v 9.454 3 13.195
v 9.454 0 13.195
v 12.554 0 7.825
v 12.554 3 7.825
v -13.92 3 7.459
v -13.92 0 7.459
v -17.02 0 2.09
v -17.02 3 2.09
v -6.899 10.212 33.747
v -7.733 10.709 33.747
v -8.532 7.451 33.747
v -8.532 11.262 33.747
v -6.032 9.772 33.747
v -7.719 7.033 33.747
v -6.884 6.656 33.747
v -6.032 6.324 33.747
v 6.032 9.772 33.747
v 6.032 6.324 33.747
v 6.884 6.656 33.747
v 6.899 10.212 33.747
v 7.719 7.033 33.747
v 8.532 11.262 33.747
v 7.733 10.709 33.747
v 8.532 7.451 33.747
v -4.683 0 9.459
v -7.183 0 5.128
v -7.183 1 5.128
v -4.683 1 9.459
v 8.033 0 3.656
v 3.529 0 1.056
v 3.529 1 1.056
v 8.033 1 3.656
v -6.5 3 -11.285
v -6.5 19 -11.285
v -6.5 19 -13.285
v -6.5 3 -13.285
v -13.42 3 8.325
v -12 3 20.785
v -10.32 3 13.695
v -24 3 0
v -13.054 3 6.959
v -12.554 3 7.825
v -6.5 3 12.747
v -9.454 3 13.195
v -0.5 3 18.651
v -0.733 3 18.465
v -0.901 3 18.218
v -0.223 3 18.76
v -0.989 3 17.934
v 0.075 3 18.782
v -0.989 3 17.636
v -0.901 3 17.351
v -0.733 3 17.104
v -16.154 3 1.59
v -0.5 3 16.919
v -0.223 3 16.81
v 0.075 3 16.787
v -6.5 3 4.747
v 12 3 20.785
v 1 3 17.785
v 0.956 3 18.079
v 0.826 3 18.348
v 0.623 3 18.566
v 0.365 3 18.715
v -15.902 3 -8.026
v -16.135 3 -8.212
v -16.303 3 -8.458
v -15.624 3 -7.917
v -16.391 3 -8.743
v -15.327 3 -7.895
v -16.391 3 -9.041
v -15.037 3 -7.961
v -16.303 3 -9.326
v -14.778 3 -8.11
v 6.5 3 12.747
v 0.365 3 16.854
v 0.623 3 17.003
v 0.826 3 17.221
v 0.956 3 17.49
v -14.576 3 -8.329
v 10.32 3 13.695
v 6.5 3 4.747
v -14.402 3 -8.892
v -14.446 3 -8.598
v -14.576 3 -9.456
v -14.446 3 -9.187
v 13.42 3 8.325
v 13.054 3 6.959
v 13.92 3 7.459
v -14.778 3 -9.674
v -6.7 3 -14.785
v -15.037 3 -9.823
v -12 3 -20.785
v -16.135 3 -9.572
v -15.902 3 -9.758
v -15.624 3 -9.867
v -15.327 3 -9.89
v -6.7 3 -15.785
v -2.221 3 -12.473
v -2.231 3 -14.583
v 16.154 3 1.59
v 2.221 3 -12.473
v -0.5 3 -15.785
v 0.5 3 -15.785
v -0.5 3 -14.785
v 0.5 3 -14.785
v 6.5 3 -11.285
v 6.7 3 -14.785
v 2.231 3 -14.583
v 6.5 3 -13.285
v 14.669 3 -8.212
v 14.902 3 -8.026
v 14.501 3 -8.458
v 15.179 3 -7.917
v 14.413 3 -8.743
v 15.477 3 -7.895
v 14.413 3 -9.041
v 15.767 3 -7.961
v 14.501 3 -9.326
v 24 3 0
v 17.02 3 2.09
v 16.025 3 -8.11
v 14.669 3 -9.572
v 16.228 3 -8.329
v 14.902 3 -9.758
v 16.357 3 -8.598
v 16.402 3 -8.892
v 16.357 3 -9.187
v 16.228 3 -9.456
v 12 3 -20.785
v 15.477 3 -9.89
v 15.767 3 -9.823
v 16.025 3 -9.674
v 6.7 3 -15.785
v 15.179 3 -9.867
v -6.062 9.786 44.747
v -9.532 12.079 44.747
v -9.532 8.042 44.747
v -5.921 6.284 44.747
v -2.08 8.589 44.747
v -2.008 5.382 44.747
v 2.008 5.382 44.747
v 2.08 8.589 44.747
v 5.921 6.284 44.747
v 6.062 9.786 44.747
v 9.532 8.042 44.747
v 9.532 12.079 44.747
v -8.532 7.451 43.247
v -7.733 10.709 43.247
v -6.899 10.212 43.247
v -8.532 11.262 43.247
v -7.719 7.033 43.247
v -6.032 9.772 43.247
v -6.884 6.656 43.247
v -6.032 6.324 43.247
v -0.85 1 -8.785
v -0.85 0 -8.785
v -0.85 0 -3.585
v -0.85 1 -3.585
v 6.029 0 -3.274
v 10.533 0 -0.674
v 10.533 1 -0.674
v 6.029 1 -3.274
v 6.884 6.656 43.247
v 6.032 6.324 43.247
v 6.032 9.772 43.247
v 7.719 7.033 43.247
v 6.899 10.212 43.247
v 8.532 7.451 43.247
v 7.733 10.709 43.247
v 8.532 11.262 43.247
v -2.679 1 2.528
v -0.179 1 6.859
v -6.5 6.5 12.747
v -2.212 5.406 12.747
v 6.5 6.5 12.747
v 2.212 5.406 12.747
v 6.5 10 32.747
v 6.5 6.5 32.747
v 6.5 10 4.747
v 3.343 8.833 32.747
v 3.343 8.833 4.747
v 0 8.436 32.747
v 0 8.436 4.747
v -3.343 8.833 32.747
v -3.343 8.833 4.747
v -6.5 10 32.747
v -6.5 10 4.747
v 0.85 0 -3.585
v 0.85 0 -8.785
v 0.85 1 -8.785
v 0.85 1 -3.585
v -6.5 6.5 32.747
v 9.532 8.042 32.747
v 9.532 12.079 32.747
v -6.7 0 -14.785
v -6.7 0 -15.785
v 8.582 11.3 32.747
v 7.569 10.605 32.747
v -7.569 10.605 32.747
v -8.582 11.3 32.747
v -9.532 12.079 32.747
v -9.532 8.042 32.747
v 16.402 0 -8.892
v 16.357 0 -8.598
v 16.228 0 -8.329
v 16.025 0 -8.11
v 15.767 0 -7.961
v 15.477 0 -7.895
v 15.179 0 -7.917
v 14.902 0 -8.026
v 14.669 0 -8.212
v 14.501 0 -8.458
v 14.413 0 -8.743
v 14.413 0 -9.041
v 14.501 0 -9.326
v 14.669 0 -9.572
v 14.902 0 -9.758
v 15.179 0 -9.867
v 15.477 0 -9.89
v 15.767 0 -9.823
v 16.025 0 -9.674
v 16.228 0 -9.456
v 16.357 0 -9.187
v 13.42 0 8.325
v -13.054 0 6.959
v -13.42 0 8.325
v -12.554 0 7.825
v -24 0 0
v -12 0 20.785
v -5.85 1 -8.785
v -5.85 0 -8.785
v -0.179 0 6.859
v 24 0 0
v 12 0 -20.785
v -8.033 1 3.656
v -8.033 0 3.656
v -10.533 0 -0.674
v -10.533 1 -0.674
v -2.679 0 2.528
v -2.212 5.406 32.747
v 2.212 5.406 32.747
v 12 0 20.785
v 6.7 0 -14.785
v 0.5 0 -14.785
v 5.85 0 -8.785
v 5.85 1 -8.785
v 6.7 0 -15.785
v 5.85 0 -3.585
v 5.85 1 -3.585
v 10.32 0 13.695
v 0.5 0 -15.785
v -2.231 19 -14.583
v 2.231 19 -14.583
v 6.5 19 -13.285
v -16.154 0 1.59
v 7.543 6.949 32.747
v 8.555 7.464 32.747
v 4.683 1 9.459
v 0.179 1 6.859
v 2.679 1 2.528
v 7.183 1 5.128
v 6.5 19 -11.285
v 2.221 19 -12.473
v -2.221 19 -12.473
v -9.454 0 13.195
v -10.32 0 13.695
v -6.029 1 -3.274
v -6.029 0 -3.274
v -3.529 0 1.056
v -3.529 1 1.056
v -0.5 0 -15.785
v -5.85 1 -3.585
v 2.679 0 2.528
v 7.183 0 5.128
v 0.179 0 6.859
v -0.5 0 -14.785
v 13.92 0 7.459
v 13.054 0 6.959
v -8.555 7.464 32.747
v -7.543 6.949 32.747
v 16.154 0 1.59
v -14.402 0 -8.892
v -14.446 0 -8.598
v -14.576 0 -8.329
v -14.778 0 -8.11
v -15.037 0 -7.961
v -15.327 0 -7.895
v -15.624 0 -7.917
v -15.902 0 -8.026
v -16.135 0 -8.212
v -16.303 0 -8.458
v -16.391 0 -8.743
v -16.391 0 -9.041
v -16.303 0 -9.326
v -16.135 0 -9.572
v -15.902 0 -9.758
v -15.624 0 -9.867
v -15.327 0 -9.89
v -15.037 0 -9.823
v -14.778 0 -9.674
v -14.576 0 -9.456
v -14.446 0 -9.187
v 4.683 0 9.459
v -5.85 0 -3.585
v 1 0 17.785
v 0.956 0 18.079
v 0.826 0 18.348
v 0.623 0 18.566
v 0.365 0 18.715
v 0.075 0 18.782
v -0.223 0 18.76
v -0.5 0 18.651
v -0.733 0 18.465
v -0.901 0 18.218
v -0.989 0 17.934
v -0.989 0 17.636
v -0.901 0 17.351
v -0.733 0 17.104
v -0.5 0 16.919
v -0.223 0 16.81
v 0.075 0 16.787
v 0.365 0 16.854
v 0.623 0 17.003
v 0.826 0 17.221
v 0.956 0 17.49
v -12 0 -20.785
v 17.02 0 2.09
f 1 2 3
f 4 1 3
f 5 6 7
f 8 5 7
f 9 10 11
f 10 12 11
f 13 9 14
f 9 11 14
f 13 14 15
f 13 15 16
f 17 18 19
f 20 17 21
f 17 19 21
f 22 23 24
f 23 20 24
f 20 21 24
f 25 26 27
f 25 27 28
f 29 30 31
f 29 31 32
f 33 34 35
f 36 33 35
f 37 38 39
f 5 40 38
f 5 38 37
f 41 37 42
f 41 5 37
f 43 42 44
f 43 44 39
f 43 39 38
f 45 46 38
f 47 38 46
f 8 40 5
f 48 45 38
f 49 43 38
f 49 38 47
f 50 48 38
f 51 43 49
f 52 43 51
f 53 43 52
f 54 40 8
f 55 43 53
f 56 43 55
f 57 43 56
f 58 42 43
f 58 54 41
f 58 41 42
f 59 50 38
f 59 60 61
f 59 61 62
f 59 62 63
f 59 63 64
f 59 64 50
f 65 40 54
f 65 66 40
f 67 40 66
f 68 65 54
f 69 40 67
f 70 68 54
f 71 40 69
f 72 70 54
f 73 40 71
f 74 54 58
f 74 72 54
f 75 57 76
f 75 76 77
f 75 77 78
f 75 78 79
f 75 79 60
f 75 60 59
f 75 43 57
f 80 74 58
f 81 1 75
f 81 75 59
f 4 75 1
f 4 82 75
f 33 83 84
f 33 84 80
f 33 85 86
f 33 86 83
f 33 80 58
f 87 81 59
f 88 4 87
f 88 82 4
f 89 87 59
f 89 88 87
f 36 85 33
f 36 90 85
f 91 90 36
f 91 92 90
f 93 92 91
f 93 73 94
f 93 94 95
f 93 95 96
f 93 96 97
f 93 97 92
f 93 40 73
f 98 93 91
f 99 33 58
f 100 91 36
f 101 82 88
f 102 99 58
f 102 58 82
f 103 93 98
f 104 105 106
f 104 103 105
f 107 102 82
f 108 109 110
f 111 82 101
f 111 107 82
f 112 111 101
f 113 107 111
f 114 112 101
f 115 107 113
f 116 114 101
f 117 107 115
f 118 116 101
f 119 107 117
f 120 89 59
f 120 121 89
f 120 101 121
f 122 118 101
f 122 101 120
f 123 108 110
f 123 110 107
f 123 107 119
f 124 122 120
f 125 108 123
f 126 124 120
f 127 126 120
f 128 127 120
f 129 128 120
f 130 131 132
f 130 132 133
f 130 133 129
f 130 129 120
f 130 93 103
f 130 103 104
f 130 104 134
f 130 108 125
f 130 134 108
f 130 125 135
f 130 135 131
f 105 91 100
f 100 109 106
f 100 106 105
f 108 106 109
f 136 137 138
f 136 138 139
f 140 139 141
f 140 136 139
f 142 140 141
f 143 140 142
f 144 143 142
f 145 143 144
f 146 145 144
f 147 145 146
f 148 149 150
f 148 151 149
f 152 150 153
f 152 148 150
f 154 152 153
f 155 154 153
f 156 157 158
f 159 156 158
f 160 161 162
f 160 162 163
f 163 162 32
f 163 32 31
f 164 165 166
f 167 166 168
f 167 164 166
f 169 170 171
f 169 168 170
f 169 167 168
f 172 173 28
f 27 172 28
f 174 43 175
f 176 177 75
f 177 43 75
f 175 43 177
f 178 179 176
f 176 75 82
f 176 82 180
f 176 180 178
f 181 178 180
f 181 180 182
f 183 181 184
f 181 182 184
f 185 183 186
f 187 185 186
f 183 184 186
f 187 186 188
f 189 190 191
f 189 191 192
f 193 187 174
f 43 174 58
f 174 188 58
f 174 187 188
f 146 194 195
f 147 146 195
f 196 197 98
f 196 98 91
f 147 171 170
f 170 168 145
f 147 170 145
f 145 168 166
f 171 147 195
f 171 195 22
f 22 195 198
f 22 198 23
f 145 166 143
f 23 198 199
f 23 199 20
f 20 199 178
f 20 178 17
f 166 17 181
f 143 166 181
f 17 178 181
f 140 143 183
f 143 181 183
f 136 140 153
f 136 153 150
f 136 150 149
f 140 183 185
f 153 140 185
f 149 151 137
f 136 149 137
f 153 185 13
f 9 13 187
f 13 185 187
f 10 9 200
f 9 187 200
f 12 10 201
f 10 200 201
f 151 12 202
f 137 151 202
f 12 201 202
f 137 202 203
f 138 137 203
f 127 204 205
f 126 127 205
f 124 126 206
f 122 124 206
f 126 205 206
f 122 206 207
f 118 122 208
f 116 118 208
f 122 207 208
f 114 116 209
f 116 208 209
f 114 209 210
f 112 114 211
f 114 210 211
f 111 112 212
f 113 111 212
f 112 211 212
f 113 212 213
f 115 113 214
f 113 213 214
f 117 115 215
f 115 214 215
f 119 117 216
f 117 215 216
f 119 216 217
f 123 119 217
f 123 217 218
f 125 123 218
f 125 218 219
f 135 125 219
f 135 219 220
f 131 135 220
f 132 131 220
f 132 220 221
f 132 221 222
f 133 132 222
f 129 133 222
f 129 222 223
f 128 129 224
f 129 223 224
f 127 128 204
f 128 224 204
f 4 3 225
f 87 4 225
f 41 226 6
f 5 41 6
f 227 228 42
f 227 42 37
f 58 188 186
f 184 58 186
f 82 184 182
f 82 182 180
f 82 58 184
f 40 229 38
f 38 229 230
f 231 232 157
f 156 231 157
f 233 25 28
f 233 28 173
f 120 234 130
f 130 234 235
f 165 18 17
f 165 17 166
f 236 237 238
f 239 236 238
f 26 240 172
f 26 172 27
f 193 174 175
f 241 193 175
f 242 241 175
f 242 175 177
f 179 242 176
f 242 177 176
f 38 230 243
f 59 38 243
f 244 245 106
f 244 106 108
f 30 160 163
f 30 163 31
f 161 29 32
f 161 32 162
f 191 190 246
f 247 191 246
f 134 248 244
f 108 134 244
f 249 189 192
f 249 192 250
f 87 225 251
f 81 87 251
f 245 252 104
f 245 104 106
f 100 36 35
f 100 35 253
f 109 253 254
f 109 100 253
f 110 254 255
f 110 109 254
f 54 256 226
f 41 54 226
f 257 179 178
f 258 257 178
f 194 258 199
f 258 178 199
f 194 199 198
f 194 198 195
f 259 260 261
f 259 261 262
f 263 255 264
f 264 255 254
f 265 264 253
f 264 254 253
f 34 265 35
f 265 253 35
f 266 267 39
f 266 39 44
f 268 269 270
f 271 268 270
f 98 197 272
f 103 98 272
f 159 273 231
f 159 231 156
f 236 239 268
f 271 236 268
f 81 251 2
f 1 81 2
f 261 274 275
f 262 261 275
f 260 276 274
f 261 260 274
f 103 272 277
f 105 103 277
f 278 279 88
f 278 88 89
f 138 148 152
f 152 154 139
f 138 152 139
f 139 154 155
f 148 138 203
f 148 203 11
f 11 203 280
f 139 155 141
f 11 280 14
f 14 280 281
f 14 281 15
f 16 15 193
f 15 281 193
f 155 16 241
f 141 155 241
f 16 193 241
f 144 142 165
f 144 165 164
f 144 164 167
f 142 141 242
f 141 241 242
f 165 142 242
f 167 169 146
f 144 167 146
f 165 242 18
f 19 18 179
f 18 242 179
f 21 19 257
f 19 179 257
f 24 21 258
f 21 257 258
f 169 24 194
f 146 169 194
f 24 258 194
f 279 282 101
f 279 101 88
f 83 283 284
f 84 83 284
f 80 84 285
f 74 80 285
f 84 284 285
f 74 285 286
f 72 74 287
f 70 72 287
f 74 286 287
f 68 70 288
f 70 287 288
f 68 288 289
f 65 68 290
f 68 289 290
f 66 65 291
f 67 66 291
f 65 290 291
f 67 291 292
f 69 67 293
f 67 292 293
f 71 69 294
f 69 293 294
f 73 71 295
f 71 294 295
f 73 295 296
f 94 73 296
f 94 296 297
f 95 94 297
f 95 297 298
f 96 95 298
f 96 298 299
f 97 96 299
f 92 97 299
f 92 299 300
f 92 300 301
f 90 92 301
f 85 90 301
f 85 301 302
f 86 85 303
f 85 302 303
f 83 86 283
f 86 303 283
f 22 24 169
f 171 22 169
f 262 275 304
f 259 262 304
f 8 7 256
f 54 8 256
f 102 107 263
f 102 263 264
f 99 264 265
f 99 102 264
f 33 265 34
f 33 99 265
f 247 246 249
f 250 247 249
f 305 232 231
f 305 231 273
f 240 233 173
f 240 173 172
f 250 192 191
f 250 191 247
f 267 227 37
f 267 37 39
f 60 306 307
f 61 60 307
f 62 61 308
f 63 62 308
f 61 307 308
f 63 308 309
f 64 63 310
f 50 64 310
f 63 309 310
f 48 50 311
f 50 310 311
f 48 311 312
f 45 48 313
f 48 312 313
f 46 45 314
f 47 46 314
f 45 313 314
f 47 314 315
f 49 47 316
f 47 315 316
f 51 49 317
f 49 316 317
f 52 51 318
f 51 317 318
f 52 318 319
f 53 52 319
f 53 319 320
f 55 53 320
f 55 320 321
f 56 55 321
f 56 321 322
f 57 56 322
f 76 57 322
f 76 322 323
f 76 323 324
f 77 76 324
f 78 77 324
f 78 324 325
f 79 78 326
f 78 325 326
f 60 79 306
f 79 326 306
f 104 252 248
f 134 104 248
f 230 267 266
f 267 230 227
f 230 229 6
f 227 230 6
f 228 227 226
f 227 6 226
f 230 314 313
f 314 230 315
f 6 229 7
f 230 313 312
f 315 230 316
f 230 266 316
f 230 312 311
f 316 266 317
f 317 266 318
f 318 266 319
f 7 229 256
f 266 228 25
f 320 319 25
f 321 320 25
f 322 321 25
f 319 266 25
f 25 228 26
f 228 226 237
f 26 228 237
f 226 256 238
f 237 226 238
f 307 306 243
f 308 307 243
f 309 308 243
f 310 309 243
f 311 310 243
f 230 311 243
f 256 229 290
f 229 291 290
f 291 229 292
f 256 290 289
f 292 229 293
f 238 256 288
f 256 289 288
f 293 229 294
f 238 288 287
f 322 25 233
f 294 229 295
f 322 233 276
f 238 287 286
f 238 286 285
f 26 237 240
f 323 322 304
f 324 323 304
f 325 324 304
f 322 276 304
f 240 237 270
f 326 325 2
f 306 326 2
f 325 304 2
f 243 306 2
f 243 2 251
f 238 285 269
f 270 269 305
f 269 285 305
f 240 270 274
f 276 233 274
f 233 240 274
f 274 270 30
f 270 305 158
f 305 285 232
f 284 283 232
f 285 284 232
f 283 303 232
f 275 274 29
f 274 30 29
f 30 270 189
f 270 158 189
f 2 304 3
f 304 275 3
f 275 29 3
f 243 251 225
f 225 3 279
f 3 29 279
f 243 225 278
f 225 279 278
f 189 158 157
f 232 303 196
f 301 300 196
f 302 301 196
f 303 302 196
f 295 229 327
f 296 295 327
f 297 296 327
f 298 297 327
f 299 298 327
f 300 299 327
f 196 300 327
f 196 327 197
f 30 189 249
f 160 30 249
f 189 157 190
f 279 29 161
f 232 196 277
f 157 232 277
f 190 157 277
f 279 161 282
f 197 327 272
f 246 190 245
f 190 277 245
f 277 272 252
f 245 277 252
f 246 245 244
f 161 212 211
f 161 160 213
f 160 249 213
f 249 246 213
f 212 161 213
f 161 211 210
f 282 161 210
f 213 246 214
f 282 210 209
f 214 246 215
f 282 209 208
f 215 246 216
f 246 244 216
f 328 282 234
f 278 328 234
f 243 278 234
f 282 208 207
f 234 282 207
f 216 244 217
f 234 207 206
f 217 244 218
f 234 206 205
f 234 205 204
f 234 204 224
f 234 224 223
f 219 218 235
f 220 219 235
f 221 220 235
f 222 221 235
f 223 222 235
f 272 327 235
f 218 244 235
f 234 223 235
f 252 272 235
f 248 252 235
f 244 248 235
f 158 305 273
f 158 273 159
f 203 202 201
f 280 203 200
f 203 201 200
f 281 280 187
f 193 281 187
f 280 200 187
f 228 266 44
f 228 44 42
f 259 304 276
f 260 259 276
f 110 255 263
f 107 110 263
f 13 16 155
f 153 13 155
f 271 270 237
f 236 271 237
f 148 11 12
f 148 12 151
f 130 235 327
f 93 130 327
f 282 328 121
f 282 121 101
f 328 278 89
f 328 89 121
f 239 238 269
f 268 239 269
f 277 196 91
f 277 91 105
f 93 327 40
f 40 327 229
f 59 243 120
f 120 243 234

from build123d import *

# Parameters (mm, degrees)
EXTRUDE_1_DEPTH     = 3
SKETCH_4_W          = 13
SKETCH_4_H          = 8
EXTRUDE_2_DEPTH     = 7
EXTRUDE_6_DEPTH     = 20
CUT_EXTRUDE_3_DEPTH = 34.531337759
EXTRUDE_7_DEPTH     = 16
SKETCH_18_W         = 6.2
SKETCH_18_H         = 1
CUT_EXTRUDE_6_DEPTH = 20
SKETCH_19_R         = 1
CUT_EXTRUDE_7_DEPTH = 3
EXTRUDE_8_DEPTH     = 12
SKETCH_24_W         = 2.5
SKETCH_24_H         = 9.5
CUT_EXTRUDE_8_DEPTH = 20
SKETCH_25_W         = 5
SKETCH_25_H         = 5.2
CUT_EXTRUDE_9_DEPTH = 1


with BuildPart() as part:
    # 草图1 → 凸台-拉伸1 (new body)
    with BuildSketch(Plane(origin=(0, 0, 0), x_dir=(1, 0, 0), z_dir=(0, 1, 0))):
        Polygon((24, 0), (12, 20.784609691), (-12, 20.784609691), (-24, 0), (-12, -20.784609691), (12, -20.784609691), align=None)
    extrude(amount=EXTRUDE_1_DEPTH)

    # 草图4 → 凸台-拉伸2 (add)
    with BuildSketch(Plane(origin=(0, 3, 0), x_dir=(1, 0, 0), z_dir=(0, 1, 0))):
        with Locations((0, -8.746728068)):
            Rectangle(SKETCH_4_W, SKETCH_4_H)
    extrude(amount=EXTRUDE_2_DEPTH)

    # 草图14 → 凸台-拉伸6 (add)
    with BuildSketch(Plane.XY.offset(12.746728068)):
        with BuildLine():
            Line((-6.5, 10), (-6.5, 6.5))
            ThreePointArc((-6.5, 6.5), (0, 5.267826192), (6.5, 6.5))
            Line((6.5, 6.5), (6.5, 10))
            ThreePointArc((6.5, 10), (0, 8.436464997), (-6.5, 10))
        make_face()
    extrude(amount=EXTRUDE_6_DEPTH)

    # 草图15 → 切除-拉伸3 (cut, through all)
    with BuildSketch(Plane.XY.offset(12.746728068)):
        with BuildLine():
            Line((6.5, 10), (-6.5, 10))
            ThreePointArc((-6.5, 10), (0, 8.436464997), (6.5, 10))
        make_face()
    extrude(amount=-CUT_EXTRUDE_3_DEPTH, mode=Mode.SUBTRACT)

    # 草图16 → 凸台-拉伸7 (add)
    with BuildSketch(Plane(origin=(0, 3, 0), x_dir=(1, 0, 0), z_dir=(0, 1, 0))):
        with BuildLine():
            Line((6.5, 13.284609691), (6.5, 11.284609691))
            ThreePointArc((6.5, 11.284609691), (0, 12.623387741), (-6.5, 11.284609691))
            Line((-6.5, 11.284609691), (-6.5, 13.284609691))
            ThreePointArc((-6.5, 13.284609691), (0, 14.747919911), (6.5, 13.284609691))
        make_face()
    extrude(amount=EXTRUDE_7_DEPTH)

    # 草图18 → 切除-拉伸6 (cut, through all)
    with BuildSketch(Plane.XZ):
        Polygon((10.319872981, 13.694675051), (9.453847577, 13.194675051), (12.553847577, 7.825317547), (13.419872981, 8.325317547), align=None)
        Polygon((13.053847577, 6.959292144), (13.919872981, 7.459292144), (17.019872981, 2.08993464), (16.153847577, 1.58993464), align=None)
        with Locations((3.6, -15.284609691)):
            Rectangle(SKETCH_18_W, SKETCH_18_H)
        with Locations((-3.6, -15.284609691)):
            Rectangle(SKETCH_18_W, SKETCH_18_H)
        Polygon((-16.153847577, 1.58993464), (-13.053847577, 6.959292144), (-13.919872981, 7.459292144), (-17.019872981, 2.08993464), align=None)
        Polygon((-12.553847577, 7.825317547), (-13.419872981, 8.325317547), (-10.319872981, 13.694675051), (-9.453847577, 13.194675051), align=None)
    extrude(amount=-CUT_EXTRUDE_6_DEPTH, mode=Mode.SUBTRACT)

    # 草图19 → 切除-拉伸7 (cut)
    with BuildSketch(Plane.XZ):
        with Locations((0, 17.784609691)):
            Circle(SKETCH_19_R)
        with Locations((15.401923789, -8.892304845)):
            Circle(SKETCH_19_R)
        with Locations((-15.401923789, -8.892304845)):
            Circle(SKETCH_19_R)
    extrude(amount=-CUT_EXTRUDE_7_DEPTH, mode=Mode.SUBTRACT)

    # 草图23 → 凸台-拉伸8 (add)
    with BuildSketch(Plane.XY.offset(32.746728068)):
        with BuildLine():
            Line((-9.532090727, 12.079217693), (-9.532090727, 8.042497168))
            ThreePointArc((-9.532090727, 8.042497168), (0, 5.267826192), (9.532090727, 8.042497168))
            Line((9.532090727, 8.042497168), (9.532090727, 12.079217693))
            ThreePointArc((9.532090727, 12.079217693), (0, 8.436464997), (-9.532090727, 12.079217693))
        make_face()
    extrude(amount=EXTRUDE_8_DEPTH)

    # 草图24 → 切除-拉伸8 (cut, through all)
    with BuildSketch(Plane.XZ):
        with Locations((-7.282090727, 38.496728068)):
            Rectangle(SKETCH_24_W, SKETCH_24_H)
        with Locations((7.282090727, 38.496728068)):
            Rectangle(SKETCH_24_W, SKETCH_24_H)
    extrude(amount=-CUT_EXTRUDE_8_DEPTH, mode=Mode.SUBTRACT)

    # 草图25 → 切除-拉伸9 (cut)
    with BuildSketch(Plane.XZ):
        Polygon((-10.532695155, -0.673943767), (-6.029363055, -3.273943767), (-3.529363055, 1.056183252), (-8.032695155, 3.656183252), align=None)
        Polygon((-7.182695155, 5.128426439), (-4.682695155, 9.458553458), (-0.179363055, 6.858553458), (-2.679363055, 2.528426439), align=None)
        Polygon((6.029363055, -3.273943767), (3.529363055, 1.056183252), (8.032695155, 3.656183252), (10.532695155, -0.673943767), align=None)
        Polygon((0.179363055, 6.858553458), (2.679363055, 2.528426439), (7.182695155, 5.128426439), (4.682695155, 9.458553458), align=None)
        with Locations((-3.35, -6.184609691)):
            Rectangle(SKETCH_25_W, SKETCH_25_H)
        with Locations((3.35, -6.184609691)):
            Rectangle(SKETCH_25_W, SKETCH_25_H)
    extrude(amount=-CUT_EXTRUDE_9_DEPTH, mode=Mode.SUBTRACT)


solid = part.part
